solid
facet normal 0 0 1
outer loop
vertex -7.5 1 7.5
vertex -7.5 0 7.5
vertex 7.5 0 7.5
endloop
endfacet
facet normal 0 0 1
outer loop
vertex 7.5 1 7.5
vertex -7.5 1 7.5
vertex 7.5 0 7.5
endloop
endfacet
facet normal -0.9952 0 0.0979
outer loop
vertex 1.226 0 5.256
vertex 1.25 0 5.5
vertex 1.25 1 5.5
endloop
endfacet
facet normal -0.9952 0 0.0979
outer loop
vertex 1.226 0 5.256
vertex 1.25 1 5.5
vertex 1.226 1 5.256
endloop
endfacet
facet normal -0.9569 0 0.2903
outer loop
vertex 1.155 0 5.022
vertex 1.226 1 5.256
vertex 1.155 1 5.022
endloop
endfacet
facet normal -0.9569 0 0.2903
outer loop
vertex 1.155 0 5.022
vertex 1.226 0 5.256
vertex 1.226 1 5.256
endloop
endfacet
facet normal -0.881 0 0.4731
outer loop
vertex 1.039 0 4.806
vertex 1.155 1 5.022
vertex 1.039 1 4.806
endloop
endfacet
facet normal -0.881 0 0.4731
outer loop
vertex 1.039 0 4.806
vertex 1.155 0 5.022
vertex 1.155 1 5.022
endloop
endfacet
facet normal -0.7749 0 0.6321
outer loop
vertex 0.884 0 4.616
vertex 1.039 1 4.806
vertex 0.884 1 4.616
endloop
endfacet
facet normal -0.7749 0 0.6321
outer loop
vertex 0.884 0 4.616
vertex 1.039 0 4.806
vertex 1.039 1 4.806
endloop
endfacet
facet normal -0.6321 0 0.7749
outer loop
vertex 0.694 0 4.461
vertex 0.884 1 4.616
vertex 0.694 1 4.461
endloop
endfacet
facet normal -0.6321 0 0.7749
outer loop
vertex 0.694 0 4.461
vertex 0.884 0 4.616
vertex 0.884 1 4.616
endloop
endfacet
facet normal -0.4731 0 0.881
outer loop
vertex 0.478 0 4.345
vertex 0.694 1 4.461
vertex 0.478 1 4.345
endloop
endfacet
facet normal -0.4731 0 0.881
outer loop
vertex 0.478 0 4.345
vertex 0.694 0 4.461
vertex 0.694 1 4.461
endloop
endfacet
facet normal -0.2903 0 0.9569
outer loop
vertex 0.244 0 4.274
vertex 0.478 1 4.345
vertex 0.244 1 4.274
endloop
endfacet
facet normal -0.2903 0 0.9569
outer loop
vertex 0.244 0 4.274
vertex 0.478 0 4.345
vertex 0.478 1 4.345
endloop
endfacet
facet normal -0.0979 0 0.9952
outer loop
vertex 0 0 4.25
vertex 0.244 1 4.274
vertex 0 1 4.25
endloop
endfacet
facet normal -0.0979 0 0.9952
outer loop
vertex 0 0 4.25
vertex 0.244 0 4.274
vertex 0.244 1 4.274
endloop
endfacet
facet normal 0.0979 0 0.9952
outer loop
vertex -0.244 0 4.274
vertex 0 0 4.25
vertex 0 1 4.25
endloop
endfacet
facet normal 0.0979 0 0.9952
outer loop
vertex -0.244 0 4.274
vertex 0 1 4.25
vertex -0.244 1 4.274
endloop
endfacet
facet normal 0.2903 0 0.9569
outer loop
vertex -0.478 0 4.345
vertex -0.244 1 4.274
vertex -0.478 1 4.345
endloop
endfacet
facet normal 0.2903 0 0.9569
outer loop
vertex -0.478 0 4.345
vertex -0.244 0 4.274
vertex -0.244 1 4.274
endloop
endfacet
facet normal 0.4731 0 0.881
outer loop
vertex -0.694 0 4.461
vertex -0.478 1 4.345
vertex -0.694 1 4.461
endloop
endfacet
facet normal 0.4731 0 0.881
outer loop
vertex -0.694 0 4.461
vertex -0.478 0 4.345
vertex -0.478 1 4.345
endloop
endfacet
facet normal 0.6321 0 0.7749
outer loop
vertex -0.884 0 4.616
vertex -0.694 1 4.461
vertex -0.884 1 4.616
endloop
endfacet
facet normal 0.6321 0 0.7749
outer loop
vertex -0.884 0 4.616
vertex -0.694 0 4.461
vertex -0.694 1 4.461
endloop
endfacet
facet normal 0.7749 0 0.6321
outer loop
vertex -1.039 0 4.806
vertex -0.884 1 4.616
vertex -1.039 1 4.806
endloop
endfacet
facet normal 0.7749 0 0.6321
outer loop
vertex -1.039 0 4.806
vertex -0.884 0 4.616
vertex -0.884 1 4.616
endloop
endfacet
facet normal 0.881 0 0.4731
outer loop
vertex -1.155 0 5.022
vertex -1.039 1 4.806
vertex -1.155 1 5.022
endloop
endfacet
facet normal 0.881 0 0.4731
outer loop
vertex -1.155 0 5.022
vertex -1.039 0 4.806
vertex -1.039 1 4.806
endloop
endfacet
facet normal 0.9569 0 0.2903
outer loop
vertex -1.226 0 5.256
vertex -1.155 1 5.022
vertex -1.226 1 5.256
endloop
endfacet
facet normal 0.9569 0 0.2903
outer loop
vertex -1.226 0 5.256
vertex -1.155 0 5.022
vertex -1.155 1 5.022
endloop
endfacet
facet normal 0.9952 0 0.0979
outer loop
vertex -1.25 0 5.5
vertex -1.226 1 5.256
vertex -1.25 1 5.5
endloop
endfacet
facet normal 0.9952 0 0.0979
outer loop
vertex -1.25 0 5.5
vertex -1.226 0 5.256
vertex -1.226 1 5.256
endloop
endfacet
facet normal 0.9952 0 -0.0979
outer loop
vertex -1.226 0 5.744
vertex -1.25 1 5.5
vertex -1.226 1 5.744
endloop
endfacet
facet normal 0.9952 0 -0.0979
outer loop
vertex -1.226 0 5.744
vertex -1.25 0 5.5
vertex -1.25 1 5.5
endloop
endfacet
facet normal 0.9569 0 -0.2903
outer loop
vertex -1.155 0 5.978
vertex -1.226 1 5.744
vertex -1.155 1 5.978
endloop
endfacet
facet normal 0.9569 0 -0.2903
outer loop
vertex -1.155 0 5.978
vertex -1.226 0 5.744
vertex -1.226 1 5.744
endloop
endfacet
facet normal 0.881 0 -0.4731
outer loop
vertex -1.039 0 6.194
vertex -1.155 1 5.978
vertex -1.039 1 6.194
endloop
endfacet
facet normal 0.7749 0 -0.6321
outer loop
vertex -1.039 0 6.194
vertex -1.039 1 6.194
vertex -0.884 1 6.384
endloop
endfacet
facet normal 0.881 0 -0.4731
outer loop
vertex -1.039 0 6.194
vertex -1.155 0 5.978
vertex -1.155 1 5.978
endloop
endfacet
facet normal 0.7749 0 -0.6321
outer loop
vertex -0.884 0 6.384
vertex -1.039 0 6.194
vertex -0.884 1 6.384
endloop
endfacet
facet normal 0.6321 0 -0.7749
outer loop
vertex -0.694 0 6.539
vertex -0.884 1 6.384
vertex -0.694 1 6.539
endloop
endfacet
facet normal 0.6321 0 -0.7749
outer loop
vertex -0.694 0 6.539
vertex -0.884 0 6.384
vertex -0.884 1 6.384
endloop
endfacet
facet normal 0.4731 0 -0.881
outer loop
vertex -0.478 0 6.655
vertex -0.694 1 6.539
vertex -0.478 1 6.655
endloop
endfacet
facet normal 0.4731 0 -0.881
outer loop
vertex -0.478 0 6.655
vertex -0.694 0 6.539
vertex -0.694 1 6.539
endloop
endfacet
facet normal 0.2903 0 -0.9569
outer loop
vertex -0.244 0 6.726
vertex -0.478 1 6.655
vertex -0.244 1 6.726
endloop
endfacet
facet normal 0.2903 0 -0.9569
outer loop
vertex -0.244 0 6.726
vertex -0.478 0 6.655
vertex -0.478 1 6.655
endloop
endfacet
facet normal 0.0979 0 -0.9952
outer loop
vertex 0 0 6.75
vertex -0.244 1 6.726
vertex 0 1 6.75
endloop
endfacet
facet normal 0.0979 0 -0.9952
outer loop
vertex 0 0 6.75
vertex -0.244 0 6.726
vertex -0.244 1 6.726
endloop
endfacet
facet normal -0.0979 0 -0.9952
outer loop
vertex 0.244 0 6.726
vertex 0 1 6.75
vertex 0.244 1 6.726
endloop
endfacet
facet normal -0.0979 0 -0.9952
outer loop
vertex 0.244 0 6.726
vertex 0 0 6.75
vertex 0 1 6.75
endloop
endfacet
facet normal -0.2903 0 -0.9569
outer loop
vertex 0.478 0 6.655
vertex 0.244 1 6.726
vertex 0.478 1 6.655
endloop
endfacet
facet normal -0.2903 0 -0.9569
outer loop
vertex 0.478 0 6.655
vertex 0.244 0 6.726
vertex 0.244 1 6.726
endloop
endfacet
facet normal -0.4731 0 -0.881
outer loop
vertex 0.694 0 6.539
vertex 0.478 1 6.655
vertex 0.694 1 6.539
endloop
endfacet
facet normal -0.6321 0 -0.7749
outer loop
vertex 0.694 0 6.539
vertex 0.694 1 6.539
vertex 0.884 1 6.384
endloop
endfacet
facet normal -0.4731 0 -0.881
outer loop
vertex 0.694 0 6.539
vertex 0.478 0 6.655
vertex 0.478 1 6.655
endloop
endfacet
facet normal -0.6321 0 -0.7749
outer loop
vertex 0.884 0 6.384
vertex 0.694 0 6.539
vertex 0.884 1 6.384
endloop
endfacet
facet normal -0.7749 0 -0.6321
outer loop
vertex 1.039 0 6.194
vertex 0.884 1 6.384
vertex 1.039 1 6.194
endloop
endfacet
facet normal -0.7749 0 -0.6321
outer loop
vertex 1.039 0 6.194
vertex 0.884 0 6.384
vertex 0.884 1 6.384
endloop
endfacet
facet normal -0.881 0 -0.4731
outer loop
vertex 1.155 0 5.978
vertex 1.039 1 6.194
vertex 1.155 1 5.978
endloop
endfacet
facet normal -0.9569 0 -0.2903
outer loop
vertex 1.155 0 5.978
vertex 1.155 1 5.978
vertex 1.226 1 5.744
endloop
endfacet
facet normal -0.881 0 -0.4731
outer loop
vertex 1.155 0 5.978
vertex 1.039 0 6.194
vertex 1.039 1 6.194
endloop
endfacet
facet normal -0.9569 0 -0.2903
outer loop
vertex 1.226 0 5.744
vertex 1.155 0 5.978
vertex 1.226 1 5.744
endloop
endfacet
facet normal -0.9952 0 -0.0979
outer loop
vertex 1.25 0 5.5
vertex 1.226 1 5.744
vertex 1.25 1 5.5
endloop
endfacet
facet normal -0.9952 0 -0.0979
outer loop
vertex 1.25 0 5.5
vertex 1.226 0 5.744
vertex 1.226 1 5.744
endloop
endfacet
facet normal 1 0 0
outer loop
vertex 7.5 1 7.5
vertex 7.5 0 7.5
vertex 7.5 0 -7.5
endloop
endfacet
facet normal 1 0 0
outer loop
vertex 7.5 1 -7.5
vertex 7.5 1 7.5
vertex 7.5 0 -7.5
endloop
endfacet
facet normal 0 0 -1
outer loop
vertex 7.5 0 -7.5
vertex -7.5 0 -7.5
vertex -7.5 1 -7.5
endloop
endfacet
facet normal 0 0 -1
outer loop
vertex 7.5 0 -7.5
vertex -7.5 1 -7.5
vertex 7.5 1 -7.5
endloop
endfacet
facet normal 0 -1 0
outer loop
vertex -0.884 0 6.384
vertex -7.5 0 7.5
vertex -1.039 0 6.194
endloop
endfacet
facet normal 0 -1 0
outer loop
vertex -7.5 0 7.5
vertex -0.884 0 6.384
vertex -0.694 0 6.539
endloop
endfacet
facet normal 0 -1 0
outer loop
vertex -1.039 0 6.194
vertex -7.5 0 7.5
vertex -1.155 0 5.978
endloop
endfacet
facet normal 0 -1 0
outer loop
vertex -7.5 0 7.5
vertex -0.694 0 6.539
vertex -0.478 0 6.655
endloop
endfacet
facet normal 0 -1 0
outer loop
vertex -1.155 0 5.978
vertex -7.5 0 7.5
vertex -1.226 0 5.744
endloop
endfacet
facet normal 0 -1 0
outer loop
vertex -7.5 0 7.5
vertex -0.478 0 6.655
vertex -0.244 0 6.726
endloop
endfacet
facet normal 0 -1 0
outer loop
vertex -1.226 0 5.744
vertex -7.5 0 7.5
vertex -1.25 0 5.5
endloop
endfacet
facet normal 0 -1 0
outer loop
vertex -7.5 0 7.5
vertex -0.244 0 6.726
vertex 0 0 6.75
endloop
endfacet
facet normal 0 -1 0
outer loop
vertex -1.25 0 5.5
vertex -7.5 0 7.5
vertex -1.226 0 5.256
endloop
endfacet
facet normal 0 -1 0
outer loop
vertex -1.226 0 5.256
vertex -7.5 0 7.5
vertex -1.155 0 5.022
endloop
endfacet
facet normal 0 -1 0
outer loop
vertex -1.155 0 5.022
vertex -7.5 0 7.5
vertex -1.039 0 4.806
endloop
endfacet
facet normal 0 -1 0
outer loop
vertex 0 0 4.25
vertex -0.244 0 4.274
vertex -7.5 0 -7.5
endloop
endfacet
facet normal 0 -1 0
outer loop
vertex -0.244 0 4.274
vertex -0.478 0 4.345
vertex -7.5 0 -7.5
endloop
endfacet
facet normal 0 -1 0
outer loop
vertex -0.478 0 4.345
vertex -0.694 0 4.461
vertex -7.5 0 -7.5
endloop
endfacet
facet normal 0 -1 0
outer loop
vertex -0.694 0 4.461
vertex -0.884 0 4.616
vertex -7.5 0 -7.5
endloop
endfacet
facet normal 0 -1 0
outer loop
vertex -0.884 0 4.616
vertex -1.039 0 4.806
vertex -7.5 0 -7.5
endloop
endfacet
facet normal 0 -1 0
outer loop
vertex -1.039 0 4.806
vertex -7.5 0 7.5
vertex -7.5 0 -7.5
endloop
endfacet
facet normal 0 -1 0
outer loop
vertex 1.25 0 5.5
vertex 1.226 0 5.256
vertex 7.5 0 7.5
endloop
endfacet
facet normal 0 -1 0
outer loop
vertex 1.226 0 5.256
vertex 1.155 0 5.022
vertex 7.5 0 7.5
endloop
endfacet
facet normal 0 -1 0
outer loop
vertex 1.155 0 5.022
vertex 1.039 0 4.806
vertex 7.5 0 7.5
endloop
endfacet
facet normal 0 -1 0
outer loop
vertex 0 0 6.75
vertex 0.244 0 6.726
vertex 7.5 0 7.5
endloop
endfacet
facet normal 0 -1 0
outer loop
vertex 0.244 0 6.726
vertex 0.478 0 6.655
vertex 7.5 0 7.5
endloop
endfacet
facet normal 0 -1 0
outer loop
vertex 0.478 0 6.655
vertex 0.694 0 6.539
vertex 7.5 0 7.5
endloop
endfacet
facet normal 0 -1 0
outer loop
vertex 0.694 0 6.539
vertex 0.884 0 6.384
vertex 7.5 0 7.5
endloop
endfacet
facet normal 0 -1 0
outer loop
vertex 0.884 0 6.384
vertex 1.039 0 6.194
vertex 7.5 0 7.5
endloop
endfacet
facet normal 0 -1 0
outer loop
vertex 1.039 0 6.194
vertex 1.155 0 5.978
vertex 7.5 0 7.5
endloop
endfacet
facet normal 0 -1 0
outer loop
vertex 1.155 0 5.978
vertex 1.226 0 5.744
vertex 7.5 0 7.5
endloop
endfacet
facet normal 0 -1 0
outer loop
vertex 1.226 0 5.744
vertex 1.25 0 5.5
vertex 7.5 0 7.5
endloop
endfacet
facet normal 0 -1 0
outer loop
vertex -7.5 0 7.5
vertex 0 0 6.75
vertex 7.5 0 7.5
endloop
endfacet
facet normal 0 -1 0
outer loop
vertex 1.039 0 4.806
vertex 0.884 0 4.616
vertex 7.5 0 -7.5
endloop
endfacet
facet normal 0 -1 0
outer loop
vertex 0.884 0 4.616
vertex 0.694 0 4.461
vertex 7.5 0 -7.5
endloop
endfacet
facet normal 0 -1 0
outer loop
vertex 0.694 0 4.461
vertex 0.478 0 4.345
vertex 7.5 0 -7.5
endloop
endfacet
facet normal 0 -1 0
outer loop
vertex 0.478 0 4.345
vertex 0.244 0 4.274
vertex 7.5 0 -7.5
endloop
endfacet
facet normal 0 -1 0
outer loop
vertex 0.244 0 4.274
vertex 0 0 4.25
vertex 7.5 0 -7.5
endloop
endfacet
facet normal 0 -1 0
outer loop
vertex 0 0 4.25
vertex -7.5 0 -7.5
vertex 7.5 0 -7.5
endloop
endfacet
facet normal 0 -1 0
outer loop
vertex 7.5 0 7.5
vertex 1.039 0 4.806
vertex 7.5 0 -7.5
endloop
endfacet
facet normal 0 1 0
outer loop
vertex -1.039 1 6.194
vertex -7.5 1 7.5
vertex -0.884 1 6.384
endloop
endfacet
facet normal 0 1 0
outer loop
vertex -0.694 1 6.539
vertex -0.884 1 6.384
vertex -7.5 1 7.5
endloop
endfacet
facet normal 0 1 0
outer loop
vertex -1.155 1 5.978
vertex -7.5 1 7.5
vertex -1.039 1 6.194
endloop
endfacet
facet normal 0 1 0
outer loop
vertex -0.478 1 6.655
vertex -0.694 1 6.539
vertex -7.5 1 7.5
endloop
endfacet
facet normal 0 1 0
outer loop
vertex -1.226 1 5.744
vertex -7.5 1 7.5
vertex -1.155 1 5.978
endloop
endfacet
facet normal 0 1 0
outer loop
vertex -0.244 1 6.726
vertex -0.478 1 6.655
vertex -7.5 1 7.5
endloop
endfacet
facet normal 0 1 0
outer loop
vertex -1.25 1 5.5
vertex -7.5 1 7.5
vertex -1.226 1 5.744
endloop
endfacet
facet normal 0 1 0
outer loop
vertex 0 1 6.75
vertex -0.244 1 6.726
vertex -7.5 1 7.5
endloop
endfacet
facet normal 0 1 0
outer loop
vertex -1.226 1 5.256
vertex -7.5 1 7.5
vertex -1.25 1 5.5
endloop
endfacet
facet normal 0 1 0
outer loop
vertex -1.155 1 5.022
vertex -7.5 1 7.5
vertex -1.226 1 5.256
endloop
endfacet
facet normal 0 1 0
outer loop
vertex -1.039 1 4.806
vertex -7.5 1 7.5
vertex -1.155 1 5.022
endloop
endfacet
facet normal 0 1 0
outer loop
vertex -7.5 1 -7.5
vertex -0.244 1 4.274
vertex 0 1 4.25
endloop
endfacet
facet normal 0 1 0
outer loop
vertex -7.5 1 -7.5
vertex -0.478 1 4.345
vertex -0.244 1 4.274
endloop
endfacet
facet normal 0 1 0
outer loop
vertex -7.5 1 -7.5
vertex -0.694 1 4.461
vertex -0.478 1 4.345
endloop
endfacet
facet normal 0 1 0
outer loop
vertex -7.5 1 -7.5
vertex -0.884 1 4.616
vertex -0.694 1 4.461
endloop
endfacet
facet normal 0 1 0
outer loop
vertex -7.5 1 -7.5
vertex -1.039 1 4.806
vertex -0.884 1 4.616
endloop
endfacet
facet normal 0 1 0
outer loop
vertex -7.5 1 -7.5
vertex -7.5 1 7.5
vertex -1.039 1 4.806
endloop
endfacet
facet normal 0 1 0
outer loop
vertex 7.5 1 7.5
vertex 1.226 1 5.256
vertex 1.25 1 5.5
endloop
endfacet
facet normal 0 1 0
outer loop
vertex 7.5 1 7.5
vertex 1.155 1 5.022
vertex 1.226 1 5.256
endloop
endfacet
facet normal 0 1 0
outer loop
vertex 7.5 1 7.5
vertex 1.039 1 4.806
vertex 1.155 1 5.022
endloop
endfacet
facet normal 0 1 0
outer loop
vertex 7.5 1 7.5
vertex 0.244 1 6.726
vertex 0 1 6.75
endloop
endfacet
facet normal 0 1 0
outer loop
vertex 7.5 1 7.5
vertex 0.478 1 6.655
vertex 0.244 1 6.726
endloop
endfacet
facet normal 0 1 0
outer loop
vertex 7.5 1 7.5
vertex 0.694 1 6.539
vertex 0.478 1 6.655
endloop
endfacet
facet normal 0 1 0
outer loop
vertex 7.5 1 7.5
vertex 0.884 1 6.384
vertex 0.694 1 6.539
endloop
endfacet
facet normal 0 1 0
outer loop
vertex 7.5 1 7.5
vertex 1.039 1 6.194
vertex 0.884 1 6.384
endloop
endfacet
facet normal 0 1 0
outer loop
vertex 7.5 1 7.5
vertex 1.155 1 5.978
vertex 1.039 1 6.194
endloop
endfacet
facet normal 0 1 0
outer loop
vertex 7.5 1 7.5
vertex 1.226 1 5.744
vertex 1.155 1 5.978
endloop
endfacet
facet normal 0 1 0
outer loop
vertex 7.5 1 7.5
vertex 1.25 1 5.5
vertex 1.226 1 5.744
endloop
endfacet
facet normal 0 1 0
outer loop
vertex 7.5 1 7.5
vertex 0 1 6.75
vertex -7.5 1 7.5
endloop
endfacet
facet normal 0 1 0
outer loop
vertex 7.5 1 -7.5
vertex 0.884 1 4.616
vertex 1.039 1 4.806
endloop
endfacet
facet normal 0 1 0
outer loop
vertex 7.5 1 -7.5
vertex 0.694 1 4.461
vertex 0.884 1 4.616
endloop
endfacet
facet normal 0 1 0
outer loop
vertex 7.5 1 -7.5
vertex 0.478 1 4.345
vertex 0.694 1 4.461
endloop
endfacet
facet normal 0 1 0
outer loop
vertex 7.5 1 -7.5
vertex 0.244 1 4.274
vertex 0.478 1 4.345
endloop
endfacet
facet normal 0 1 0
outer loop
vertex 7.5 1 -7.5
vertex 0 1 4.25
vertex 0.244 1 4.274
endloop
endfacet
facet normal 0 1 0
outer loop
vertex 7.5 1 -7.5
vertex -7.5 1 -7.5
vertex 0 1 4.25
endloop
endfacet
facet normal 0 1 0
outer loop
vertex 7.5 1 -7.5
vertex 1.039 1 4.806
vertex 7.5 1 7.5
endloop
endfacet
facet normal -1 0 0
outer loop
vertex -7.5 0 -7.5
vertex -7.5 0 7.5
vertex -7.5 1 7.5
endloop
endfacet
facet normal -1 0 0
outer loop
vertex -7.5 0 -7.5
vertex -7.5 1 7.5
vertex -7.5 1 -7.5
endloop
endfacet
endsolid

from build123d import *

# Parameters (mm, degrees)
SKETCH_1_W      = 15
SKETCH_1_H      = 15
SKETCH_1_R      = 1.25
EXTRUDE_1_DEPTH = 1


with BuildPart() as part:
    # 草图1 → 凸台-拉伸1 (new body)
    with BuildSketch(Plane(origin=(0, 0, 0), x_dir=(1, 0, 0), z_dir=(0, 1, 0))):
        Rectangle(SKETCH_1_W, SKETCH_1_H)
        with Locations((0, -5.5)):
            Circle(SKETCH_1_R, mode=Mode.SUBTRACT)
    extrude(amount=EXTRUDE_1_DEPTH)


solid = part.part
